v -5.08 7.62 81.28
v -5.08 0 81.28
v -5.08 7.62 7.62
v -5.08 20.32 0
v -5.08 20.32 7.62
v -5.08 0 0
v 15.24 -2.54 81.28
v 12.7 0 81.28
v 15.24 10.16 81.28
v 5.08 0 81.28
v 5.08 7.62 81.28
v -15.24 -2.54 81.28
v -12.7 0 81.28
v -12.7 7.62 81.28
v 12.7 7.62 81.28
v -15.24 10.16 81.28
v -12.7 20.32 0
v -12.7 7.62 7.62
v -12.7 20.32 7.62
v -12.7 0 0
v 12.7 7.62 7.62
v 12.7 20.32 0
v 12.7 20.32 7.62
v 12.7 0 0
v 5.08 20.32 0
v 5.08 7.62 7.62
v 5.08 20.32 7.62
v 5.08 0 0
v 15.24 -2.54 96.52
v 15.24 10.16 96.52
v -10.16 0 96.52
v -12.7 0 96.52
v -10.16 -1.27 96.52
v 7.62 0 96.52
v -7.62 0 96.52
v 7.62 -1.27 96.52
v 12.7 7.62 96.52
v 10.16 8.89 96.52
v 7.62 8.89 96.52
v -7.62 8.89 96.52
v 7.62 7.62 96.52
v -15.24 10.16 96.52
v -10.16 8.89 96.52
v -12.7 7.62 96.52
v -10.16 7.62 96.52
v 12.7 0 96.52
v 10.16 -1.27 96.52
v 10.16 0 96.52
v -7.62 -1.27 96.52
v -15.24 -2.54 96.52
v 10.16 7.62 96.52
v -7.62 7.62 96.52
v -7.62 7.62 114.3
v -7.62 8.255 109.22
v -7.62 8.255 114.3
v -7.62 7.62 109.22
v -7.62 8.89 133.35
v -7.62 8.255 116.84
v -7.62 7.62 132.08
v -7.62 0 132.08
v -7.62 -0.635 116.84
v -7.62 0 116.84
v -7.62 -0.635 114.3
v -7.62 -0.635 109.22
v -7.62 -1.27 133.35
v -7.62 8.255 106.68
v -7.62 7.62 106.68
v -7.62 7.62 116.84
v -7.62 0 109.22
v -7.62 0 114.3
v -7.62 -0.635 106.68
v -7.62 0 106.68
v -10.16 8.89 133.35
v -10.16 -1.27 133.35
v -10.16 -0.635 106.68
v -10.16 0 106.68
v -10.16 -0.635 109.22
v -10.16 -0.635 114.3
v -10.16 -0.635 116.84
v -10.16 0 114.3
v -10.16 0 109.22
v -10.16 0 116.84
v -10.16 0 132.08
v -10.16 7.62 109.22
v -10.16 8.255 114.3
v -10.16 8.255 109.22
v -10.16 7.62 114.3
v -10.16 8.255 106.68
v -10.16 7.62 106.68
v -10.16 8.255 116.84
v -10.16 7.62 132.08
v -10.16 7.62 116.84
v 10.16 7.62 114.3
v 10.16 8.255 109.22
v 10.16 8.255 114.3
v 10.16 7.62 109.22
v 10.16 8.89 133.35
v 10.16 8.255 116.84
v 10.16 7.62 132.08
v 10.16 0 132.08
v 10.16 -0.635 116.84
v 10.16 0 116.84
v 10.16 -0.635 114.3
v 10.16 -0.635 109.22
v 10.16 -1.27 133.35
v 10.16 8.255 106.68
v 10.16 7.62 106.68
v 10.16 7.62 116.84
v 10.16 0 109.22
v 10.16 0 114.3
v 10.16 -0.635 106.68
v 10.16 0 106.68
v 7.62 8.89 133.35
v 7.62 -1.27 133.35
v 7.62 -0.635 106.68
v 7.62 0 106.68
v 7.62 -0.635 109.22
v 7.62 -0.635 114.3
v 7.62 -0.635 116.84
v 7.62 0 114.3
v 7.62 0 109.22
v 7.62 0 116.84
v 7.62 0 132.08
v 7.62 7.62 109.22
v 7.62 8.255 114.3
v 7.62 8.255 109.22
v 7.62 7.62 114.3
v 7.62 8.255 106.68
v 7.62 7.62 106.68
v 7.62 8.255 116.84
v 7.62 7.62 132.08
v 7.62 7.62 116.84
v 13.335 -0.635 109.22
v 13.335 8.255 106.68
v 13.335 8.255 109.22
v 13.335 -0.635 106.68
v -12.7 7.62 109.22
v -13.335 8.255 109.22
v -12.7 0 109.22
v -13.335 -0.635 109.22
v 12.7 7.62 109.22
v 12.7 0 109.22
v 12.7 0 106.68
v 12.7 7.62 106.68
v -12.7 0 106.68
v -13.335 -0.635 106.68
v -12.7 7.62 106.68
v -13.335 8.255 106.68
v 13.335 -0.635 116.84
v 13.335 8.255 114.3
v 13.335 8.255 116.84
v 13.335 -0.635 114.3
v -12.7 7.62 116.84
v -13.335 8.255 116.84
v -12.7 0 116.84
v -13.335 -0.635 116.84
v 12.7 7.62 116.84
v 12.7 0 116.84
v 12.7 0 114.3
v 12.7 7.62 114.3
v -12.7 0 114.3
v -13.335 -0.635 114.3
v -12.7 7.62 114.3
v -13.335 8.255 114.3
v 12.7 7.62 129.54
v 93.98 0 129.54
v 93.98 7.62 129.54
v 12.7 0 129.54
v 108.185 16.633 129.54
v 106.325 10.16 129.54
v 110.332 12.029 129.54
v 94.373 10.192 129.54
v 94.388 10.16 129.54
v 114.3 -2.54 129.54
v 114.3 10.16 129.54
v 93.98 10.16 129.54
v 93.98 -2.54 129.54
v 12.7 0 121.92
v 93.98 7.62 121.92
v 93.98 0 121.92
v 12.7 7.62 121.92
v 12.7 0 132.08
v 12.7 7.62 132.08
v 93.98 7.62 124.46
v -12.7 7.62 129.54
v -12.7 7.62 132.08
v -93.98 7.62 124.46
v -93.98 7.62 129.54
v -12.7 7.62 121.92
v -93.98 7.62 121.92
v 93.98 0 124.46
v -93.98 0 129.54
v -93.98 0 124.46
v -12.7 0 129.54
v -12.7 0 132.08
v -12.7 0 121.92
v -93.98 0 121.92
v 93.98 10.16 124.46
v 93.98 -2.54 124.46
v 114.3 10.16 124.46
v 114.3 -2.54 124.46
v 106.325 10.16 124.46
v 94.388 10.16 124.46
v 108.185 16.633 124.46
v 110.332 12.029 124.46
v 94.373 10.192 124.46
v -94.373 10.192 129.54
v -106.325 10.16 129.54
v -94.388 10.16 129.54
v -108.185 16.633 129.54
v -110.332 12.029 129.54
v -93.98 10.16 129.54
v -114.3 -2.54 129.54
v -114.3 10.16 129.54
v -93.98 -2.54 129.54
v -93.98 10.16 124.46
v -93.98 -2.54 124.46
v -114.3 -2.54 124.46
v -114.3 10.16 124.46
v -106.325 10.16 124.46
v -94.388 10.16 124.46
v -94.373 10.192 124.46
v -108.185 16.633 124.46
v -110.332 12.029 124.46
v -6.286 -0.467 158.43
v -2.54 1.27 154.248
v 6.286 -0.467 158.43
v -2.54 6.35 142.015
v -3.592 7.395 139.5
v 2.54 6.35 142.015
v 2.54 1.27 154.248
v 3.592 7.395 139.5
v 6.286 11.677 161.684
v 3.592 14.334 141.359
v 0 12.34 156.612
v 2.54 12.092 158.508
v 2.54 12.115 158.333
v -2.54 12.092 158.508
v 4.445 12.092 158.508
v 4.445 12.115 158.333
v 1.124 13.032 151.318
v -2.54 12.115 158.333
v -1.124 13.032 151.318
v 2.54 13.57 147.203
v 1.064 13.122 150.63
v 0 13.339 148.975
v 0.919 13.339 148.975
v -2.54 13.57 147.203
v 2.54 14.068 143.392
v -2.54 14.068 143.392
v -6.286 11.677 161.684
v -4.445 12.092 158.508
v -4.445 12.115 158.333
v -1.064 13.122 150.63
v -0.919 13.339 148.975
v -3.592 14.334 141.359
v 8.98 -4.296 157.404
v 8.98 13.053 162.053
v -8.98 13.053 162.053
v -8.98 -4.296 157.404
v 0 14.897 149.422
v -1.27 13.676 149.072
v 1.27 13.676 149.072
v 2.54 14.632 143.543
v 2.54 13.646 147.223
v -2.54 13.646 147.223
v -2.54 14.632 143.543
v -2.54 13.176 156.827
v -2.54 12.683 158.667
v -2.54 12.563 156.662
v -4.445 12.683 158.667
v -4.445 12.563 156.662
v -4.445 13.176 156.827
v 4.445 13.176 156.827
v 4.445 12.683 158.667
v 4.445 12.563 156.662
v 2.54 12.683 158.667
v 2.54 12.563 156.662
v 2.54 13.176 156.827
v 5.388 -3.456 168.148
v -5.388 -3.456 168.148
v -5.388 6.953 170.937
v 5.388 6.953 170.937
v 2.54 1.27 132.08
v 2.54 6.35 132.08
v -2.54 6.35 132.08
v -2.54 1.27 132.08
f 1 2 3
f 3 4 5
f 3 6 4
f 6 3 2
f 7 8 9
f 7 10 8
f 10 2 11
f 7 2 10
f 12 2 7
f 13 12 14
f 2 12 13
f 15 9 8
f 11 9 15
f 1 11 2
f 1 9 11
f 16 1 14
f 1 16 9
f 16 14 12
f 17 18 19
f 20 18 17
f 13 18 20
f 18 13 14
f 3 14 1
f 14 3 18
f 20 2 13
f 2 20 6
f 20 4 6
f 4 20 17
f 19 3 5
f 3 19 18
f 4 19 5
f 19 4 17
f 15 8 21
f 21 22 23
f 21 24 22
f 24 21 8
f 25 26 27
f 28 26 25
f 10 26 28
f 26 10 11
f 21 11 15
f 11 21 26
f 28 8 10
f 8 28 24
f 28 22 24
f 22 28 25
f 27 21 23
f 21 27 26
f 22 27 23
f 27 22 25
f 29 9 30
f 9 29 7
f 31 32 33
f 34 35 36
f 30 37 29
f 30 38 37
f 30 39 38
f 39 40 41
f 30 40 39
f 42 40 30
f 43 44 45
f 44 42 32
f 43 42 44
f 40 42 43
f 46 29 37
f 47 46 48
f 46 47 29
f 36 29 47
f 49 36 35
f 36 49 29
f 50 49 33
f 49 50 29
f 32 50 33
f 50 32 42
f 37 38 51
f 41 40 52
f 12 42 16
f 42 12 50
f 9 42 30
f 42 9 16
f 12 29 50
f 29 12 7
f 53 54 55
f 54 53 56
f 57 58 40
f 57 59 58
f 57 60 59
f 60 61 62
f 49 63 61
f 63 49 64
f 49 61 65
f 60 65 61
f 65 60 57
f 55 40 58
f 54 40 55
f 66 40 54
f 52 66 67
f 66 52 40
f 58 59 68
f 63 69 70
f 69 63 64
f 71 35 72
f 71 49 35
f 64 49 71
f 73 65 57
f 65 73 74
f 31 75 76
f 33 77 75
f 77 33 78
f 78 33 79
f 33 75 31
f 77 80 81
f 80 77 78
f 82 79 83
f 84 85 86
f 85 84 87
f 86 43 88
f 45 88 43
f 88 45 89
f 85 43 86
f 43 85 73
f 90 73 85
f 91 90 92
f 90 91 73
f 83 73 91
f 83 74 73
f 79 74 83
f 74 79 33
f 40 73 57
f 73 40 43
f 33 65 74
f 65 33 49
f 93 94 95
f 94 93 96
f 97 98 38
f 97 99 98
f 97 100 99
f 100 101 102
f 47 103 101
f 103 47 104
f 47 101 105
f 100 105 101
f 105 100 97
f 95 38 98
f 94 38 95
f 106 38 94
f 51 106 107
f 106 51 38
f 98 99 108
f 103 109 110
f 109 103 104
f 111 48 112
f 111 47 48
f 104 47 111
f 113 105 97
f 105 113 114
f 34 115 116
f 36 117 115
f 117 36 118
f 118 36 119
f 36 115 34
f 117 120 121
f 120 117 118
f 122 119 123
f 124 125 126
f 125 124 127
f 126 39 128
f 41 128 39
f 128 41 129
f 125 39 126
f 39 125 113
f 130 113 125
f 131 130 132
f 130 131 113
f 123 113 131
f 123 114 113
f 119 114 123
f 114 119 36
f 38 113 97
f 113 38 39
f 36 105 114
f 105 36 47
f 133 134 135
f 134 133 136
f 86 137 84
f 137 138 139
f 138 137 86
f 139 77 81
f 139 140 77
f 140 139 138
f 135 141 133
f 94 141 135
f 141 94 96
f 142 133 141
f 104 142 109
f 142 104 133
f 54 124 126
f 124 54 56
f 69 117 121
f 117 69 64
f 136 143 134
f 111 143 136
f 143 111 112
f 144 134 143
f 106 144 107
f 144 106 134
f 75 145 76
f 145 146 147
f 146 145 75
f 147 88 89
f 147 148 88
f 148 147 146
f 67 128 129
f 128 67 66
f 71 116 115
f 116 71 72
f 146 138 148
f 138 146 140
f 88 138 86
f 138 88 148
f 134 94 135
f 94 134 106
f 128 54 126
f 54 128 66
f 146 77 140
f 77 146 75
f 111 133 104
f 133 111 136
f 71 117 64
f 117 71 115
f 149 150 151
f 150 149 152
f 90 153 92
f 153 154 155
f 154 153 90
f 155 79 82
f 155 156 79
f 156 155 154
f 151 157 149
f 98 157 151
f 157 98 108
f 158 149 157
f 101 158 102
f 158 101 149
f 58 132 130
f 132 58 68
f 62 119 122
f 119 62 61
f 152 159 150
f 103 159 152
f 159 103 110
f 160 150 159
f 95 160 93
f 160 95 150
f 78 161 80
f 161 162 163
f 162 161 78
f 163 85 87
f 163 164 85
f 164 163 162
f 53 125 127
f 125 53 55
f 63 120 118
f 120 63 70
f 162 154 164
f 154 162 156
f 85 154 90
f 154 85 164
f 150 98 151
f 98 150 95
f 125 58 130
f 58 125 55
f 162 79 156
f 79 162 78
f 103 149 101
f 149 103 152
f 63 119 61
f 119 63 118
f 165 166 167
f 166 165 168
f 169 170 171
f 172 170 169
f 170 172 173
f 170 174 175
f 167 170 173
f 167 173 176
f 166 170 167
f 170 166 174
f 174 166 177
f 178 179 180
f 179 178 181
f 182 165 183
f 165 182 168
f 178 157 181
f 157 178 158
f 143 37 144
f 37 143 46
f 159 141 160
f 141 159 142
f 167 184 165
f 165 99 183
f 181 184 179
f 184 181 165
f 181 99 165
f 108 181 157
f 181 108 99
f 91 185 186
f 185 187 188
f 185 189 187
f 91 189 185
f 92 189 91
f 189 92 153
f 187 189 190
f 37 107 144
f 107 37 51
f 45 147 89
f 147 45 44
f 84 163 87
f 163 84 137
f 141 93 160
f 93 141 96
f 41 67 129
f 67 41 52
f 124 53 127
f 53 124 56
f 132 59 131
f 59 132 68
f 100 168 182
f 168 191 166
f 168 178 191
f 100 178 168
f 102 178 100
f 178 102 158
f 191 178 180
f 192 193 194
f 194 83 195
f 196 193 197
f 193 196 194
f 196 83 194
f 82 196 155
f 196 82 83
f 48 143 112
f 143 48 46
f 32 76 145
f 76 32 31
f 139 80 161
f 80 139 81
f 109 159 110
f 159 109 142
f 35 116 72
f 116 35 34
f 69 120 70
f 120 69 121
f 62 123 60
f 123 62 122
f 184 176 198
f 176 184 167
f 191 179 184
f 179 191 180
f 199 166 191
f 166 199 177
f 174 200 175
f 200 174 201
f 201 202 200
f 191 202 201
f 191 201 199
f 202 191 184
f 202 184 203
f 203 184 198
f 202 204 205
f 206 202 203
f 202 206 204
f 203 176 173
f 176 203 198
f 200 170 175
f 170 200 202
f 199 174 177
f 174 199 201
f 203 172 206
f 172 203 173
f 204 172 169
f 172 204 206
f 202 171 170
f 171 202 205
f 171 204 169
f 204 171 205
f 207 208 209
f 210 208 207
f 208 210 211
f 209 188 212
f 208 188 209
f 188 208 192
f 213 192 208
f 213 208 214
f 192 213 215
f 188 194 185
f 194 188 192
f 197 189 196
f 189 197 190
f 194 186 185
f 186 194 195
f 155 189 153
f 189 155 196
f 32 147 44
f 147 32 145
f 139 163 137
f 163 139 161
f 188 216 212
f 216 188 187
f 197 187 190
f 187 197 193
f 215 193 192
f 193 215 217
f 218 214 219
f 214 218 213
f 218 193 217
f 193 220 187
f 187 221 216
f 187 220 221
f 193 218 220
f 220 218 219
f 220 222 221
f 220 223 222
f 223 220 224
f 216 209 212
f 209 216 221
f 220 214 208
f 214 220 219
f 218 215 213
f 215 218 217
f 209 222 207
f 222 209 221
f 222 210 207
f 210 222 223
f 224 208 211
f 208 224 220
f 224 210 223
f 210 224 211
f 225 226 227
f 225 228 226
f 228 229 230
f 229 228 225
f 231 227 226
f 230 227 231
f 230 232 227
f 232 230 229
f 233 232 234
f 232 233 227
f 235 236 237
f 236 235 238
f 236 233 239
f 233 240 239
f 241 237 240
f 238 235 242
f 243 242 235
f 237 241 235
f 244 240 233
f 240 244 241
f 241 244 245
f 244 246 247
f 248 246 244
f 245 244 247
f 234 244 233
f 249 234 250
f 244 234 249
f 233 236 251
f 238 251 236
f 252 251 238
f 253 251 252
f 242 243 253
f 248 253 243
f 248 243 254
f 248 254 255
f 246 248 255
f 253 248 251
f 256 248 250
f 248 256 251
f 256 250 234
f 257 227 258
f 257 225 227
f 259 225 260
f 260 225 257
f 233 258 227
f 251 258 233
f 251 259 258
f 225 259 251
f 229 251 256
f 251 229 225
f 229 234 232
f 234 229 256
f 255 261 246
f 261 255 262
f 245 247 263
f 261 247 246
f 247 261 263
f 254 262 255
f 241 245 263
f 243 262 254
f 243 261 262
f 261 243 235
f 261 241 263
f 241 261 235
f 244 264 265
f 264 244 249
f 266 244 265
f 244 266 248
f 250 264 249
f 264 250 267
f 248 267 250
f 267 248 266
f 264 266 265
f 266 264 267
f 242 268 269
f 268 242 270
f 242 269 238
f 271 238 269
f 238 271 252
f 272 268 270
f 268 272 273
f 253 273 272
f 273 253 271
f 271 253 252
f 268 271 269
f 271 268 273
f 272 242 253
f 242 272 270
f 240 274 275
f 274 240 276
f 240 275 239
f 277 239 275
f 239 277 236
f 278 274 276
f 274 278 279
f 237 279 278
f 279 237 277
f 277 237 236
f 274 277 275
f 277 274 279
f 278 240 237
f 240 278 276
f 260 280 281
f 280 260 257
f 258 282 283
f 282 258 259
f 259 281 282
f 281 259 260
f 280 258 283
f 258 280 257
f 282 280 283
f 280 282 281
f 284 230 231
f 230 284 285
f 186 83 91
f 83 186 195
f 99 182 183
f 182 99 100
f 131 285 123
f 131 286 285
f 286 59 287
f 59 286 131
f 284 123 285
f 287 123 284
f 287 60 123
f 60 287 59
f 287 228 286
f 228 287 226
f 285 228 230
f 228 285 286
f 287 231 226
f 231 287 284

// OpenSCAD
module leg()
{
	translate([0,0,16])
		cube([3,3,16]);
	translate([0,0,0])
		cube([3,3,16]);
	translate([0,0,0])
		cube([3,8,3]);
}

module arm()
{
	color("white")
	{
		translate([0,0,0])
			cube([16,3,3]);
		translate([16,0,0])
			cube([16,3,3]);
	}
	color("#AA5500")
	{
		translate([32,-1,1])
		{
			cube([8,5,2]);
			translate([1,3.2,0])
			rotate([0,0,25])
				cube([6,2,2]);
		}
	}
}

module neck(jawrot)
{
	color("pink")
	{
		translate([-1,0.5,4])
			cube([2,2,10]);	
	}
}

module head(jawrot)
{
	color("pink")
	{
//		translate([-2,4,10])
//			rotate([-jawrot,0,0])
//			translate([0,0,-2])
//				cube([4,4,2]);	

//		translate([-3,0,8])
//			cube([1,7,2]);	
//		translate([2,0,8])
//			cube([1,7,2]);	

//		translate([-3,0,10])
//			cube([6,8,6]);	

//		translate([-2.5,4,8])
//			cube([5,4,8]);	

		translate([0,5.5,8])
		rotate([0,0,45])
			cylinder(h=8,r1=2,r2=3.5,center=false,$fn=4);

//		translate([-0.4,8,11])
//			cube([1,1,2]);	
		translate([0,7.45,11])
			rotate([1,0,0])
		{
//			cube([1,1,4]);
			cylinder(h=4,r1=0.5,r2=0.25,center=false,$fn=4);
		}
	}

	color("black")
	{
		translate([-1,7,10-jawrot*0.08])
			cube([2,0.25,jawrot*0.1]);

		translate([-1.75,7.8,14])
			cube([0.75,0.25,0.75]);
		translate([1.0,7.8,14])
			cube([0.75,0.25,0.75]);
	}

	color("brown")
	{
		translate([-4,-1,14])
		{
//			cube([8,8,5]);
		}
		translate([0,5,16])
		{
			rotate([0,0,45])
			cylinder(h=4,r1=5,r2=3,center=false,$fn=4);
		}

	}
}

scale(2.54)
{
	color("gray")
	{
	translate([-5,0,0])
		leg();
	translate([2,0,0])
		leg();
	translate([-6,-1,32])
		cube([12,5,6]);

	translate([-4,-0.5,33])
		cube([1,4,19.5]);
	translate([3,-0.5,33])
		cube([1,4,19.5]);
	}

	color("violet")
	{
	translate([-5.25,-0.25,42])
		cube([10.5,3.5,1]);

	translate([-5.25,-0.25,45])
		cube([10.5,3.5,1]);
	}
	
	color("white")
	{
//		translate([-6,0,38])
//			cube([12,4,14]);
		translate([-5,0,38])
			cube([10,3,14]);
	}

	translate([5,0,48])
		arm();

	translate([-5,0,48])
		scale([-1, 1, 1])
			arm();

	translate([0,0,48])
	{
		neck(0);
		translate([0,0,2])
		rotate([15,0,0])
			translate([0,0,-4])
			head(15);
	}
}
